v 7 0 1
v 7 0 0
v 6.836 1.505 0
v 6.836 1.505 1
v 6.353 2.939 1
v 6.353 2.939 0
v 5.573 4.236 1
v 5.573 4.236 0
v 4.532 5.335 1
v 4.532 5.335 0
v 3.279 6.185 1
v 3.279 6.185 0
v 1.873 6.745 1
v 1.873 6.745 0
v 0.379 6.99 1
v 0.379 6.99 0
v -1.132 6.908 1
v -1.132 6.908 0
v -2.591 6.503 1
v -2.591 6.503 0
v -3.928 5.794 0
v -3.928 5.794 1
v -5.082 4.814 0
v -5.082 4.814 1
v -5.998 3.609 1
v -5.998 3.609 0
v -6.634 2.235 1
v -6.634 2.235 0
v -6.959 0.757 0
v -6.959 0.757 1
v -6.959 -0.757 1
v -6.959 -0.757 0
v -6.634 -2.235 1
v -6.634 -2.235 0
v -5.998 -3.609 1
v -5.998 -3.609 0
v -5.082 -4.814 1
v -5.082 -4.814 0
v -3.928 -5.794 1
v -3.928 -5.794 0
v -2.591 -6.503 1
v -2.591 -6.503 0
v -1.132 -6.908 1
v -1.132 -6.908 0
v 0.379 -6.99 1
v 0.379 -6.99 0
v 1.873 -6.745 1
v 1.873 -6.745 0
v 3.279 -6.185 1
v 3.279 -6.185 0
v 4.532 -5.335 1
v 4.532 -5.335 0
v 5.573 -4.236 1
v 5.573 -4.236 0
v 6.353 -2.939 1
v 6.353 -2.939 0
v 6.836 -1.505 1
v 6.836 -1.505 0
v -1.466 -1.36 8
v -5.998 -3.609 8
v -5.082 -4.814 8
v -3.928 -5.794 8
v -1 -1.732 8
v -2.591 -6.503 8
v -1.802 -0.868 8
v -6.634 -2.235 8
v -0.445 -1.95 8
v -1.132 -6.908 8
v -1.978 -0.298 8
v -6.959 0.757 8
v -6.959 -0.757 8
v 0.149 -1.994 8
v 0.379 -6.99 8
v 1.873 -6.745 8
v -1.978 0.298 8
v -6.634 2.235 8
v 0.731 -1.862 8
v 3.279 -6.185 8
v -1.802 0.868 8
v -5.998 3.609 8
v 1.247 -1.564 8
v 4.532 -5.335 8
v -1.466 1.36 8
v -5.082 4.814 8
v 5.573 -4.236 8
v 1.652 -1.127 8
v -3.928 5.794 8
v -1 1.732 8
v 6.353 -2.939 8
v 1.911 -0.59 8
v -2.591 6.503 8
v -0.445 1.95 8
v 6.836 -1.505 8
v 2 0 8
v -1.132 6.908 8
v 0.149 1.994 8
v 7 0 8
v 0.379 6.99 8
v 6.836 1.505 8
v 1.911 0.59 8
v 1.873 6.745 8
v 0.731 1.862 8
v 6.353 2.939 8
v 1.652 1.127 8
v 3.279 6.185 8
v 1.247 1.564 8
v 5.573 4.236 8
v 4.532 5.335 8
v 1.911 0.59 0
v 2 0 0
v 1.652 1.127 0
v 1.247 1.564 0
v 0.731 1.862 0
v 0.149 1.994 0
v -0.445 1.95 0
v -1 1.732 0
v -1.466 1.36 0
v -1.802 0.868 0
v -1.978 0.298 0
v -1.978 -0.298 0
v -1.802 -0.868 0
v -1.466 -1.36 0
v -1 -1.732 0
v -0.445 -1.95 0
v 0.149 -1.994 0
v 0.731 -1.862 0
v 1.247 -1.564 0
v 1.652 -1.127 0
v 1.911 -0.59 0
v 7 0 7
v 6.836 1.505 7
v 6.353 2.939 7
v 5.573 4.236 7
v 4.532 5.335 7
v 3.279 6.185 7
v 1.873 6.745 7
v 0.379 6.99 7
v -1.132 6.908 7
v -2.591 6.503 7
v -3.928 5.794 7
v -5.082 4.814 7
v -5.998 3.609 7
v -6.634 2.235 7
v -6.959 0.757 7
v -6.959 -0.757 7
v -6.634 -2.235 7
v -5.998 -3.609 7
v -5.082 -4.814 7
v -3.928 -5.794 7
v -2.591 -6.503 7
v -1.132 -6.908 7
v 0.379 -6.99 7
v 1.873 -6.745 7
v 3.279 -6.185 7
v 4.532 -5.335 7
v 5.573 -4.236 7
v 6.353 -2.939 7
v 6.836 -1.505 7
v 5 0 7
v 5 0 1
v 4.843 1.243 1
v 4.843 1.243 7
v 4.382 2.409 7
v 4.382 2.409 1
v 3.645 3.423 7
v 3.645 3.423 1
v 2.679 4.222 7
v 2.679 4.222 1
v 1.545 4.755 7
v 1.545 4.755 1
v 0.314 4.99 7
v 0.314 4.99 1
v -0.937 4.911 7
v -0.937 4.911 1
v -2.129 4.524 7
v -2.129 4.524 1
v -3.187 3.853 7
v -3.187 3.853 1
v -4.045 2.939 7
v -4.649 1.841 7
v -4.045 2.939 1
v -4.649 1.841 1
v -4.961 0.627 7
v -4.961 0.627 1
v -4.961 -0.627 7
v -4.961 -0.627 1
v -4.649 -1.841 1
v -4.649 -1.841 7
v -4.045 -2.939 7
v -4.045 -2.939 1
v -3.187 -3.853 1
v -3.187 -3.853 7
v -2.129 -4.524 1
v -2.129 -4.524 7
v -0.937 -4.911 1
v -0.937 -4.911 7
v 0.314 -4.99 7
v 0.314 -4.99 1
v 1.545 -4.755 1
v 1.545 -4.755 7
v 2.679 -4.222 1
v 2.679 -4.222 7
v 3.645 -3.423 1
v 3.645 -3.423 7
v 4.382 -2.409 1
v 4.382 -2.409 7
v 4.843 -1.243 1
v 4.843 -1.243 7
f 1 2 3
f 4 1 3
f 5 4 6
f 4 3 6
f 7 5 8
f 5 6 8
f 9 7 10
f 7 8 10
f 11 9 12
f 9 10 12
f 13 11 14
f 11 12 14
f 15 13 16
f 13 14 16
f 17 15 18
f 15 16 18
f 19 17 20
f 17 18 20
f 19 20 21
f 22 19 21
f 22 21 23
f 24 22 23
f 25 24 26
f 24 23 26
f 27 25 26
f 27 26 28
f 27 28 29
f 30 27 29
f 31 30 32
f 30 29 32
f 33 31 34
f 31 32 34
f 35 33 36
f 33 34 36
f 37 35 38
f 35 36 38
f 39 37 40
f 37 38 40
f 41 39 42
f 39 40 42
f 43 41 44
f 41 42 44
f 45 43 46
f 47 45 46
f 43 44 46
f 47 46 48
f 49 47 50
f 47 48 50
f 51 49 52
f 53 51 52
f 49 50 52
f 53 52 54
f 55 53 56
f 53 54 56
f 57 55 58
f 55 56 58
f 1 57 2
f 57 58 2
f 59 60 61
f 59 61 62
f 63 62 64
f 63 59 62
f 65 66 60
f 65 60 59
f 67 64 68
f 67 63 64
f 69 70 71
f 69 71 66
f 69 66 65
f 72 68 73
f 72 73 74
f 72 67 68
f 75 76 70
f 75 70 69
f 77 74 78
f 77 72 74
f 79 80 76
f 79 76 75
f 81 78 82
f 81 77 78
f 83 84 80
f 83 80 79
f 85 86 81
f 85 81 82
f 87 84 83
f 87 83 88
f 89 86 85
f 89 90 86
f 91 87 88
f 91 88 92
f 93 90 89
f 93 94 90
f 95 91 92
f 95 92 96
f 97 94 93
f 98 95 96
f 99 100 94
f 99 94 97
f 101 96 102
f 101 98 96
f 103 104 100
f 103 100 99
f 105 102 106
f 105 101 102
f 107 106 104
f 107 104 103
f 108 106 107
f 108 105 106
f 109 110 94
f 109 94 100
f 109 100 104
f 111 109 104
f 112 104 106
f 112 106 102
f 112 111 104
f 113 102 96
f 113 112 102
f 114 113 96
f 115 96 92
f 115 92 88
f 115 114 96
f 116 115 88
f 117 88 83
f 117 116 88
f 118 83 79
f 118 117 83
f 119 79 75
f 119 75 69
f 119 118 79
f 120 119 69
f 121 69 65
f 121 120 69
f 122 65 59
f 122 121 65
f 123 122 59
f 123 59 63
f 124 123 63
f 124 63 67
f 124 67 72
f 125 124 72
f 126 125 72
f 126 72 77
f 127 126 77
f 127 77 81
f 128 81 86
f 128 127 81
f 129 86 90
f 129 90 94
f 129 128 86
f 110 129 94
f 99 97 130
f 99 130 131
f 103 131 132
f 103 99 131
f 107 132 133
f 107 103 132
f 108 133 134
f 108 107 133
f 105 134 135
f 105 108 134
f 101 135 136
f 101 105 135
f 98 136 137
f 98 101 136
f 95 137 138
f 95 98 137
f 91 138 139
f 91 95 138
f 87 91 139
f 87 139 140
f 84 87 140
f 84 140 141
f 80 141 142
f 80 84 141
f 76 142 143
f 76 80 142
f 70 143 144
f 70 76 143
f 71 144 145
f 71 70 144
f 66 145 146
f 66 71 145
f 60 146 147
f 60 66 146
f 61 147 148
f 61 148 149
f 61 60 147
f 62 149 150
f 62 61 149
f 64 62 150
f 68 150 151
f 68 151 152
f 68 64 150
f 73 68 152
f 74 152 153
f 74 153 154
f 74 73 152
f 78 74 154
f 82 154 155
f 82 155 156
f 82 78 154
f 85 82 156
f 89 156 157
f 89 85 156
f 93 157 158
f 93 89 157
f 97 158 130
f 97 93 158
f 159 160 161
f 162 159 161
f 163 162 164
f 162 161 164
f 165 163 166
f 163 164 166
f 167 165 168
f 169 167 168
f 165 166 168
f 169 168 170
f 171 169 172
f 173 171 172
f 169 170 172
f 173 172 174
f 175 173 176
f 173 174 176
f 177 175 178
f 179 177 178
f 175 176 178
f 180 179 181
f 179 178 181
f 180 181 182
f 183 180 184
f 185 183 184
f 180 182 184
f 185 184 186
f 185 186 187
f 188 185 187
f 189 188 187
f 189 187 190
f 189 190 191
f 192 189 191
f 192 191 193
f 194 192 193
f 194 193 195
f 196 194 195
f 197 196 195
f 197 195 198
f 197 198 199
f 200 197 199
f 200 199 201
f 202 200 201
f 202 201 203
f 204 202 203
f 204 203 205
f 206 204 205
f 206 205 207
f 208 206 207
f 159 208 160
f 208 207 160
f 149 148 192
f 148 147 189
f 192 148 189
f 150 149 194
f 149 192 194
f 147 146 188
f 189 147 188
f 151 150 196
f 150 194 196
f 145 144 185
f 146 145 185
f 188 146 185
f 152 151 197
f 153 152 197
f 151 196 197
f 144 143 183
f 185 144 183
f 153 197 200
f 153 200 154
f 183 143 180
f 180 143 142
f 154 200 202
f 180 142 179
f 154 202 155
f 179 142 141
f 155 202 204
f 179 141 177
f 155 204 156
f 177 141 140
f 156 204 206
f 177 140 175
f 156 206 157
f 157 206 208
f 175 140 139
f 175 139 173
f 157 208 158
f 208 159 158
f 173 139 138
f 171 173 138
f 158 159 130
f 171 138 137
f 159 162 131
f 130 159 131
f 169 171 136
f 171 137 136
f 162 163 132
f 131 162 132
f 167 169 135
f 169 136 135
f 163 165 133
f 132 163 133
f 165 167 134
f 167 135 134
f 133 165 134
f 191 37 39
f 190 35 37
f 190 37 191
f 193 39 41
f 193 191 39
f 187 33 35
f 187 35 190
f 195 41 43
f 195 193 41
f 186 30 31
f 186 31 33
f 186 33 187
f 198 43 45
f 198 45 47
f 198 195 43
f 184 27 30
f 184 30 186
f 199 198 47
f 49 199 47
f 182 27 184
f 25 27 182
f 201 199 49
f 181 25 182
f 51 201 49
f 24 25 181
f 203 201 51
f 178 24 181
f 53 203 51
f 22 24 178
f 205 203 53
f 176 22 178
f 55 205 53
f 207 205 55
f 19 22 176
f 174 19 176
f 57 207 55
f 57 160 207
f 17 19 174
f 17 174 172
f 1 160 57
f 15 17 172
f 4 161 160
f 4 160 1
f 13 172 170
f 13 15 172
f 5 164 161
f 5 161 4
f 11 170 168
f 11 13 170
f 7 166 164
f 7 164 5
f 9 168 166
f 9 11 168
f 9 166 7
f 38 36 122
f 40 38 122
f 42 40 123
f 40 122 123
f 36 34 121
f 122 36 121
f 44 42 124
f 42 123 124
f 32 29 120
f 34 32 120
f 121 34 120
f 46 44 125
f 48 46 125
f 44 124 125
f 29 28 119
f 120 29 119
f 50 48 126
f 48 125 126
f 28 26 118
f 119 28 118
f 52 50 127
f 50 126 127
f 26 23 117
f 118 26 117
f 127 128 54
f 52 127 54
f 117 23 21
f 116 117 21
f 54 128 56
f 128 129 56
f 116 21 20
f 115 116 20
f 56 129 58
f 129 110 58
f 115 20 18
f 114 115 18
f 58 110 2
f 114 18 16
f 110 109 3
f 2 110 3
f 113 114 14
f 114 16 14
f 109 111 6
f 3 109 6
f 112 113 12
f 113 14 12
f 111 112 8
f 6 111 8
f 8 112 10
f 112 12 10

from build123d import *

# Parameters (mm, degrees)
F0_R     = 5
F0_R_2   = 2
F1_DEPTH = 8
F0_R_3   = 7
F2_DEPTH = 1
F3_R     = 7
F3_R_2   = 5
F4_DEPTH = 1


with BuildPart() as f1:
    # F0 (on Top) → F1 (new body)
    with BuildSketch(Plane.XY):
        Circle(F0_R)
        Circle(F0_R_2, mode=Mode.SUBTRACT)
    extrude(amount=F1_DEPTH)

    # F0 (on Top) → F2 (join)
    with BuildSketch(Plane.XY):
        Circle(F0_R_3)
        Circle(F0_R, mode=Mode.SUBTRACT)
    extrude(amount=F2_DEPTH)

    # F3 (on face) → F4 (join)
    with BuildSketch(Plane.XY.offset(8)):
        Circle(F3_R)
        Circle(F3_R_2, mode=Mode.SUBTRACT)
    extrude(amount=-F4_DEPTH)


solid = f1.part
